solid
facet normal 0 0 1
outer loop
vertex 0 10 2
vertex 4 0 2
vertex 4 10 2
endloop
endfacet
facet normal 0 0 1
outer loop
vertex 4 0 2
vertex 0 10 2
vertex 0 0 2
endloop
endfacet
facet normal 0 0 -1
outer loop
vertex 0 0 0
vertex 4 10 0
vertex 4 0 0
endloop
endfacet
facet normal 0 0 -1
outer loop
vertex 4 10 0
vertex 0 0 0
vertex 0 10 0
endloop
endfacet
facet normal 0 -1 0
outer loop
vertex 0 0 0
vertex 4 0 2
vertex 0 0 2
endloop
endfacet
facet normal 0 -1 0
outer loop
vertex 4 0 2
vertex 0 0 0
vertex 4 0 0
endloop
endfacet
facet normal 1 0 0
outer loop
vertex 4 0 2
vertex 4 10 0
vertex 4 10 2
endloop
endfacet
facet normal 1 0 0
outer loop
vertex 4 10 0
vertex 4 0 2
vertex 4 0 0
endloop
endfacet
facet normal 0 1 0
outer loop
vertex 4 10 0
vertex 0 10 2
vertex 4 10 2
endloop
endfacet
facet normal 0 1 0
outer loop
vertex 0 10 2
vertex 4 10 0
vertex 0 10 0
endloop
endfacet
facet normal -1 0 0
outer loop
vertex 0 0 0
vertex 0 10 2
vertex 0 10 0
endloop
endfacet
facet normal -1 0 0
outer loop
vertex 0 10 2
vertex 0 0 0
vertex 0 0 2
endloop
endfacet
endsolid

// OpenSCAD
// A clip that seats in the bracket's slot (a records fixture; never rendered by the tests).
tab = 4.0;
cube([tab, 10, 2]);
